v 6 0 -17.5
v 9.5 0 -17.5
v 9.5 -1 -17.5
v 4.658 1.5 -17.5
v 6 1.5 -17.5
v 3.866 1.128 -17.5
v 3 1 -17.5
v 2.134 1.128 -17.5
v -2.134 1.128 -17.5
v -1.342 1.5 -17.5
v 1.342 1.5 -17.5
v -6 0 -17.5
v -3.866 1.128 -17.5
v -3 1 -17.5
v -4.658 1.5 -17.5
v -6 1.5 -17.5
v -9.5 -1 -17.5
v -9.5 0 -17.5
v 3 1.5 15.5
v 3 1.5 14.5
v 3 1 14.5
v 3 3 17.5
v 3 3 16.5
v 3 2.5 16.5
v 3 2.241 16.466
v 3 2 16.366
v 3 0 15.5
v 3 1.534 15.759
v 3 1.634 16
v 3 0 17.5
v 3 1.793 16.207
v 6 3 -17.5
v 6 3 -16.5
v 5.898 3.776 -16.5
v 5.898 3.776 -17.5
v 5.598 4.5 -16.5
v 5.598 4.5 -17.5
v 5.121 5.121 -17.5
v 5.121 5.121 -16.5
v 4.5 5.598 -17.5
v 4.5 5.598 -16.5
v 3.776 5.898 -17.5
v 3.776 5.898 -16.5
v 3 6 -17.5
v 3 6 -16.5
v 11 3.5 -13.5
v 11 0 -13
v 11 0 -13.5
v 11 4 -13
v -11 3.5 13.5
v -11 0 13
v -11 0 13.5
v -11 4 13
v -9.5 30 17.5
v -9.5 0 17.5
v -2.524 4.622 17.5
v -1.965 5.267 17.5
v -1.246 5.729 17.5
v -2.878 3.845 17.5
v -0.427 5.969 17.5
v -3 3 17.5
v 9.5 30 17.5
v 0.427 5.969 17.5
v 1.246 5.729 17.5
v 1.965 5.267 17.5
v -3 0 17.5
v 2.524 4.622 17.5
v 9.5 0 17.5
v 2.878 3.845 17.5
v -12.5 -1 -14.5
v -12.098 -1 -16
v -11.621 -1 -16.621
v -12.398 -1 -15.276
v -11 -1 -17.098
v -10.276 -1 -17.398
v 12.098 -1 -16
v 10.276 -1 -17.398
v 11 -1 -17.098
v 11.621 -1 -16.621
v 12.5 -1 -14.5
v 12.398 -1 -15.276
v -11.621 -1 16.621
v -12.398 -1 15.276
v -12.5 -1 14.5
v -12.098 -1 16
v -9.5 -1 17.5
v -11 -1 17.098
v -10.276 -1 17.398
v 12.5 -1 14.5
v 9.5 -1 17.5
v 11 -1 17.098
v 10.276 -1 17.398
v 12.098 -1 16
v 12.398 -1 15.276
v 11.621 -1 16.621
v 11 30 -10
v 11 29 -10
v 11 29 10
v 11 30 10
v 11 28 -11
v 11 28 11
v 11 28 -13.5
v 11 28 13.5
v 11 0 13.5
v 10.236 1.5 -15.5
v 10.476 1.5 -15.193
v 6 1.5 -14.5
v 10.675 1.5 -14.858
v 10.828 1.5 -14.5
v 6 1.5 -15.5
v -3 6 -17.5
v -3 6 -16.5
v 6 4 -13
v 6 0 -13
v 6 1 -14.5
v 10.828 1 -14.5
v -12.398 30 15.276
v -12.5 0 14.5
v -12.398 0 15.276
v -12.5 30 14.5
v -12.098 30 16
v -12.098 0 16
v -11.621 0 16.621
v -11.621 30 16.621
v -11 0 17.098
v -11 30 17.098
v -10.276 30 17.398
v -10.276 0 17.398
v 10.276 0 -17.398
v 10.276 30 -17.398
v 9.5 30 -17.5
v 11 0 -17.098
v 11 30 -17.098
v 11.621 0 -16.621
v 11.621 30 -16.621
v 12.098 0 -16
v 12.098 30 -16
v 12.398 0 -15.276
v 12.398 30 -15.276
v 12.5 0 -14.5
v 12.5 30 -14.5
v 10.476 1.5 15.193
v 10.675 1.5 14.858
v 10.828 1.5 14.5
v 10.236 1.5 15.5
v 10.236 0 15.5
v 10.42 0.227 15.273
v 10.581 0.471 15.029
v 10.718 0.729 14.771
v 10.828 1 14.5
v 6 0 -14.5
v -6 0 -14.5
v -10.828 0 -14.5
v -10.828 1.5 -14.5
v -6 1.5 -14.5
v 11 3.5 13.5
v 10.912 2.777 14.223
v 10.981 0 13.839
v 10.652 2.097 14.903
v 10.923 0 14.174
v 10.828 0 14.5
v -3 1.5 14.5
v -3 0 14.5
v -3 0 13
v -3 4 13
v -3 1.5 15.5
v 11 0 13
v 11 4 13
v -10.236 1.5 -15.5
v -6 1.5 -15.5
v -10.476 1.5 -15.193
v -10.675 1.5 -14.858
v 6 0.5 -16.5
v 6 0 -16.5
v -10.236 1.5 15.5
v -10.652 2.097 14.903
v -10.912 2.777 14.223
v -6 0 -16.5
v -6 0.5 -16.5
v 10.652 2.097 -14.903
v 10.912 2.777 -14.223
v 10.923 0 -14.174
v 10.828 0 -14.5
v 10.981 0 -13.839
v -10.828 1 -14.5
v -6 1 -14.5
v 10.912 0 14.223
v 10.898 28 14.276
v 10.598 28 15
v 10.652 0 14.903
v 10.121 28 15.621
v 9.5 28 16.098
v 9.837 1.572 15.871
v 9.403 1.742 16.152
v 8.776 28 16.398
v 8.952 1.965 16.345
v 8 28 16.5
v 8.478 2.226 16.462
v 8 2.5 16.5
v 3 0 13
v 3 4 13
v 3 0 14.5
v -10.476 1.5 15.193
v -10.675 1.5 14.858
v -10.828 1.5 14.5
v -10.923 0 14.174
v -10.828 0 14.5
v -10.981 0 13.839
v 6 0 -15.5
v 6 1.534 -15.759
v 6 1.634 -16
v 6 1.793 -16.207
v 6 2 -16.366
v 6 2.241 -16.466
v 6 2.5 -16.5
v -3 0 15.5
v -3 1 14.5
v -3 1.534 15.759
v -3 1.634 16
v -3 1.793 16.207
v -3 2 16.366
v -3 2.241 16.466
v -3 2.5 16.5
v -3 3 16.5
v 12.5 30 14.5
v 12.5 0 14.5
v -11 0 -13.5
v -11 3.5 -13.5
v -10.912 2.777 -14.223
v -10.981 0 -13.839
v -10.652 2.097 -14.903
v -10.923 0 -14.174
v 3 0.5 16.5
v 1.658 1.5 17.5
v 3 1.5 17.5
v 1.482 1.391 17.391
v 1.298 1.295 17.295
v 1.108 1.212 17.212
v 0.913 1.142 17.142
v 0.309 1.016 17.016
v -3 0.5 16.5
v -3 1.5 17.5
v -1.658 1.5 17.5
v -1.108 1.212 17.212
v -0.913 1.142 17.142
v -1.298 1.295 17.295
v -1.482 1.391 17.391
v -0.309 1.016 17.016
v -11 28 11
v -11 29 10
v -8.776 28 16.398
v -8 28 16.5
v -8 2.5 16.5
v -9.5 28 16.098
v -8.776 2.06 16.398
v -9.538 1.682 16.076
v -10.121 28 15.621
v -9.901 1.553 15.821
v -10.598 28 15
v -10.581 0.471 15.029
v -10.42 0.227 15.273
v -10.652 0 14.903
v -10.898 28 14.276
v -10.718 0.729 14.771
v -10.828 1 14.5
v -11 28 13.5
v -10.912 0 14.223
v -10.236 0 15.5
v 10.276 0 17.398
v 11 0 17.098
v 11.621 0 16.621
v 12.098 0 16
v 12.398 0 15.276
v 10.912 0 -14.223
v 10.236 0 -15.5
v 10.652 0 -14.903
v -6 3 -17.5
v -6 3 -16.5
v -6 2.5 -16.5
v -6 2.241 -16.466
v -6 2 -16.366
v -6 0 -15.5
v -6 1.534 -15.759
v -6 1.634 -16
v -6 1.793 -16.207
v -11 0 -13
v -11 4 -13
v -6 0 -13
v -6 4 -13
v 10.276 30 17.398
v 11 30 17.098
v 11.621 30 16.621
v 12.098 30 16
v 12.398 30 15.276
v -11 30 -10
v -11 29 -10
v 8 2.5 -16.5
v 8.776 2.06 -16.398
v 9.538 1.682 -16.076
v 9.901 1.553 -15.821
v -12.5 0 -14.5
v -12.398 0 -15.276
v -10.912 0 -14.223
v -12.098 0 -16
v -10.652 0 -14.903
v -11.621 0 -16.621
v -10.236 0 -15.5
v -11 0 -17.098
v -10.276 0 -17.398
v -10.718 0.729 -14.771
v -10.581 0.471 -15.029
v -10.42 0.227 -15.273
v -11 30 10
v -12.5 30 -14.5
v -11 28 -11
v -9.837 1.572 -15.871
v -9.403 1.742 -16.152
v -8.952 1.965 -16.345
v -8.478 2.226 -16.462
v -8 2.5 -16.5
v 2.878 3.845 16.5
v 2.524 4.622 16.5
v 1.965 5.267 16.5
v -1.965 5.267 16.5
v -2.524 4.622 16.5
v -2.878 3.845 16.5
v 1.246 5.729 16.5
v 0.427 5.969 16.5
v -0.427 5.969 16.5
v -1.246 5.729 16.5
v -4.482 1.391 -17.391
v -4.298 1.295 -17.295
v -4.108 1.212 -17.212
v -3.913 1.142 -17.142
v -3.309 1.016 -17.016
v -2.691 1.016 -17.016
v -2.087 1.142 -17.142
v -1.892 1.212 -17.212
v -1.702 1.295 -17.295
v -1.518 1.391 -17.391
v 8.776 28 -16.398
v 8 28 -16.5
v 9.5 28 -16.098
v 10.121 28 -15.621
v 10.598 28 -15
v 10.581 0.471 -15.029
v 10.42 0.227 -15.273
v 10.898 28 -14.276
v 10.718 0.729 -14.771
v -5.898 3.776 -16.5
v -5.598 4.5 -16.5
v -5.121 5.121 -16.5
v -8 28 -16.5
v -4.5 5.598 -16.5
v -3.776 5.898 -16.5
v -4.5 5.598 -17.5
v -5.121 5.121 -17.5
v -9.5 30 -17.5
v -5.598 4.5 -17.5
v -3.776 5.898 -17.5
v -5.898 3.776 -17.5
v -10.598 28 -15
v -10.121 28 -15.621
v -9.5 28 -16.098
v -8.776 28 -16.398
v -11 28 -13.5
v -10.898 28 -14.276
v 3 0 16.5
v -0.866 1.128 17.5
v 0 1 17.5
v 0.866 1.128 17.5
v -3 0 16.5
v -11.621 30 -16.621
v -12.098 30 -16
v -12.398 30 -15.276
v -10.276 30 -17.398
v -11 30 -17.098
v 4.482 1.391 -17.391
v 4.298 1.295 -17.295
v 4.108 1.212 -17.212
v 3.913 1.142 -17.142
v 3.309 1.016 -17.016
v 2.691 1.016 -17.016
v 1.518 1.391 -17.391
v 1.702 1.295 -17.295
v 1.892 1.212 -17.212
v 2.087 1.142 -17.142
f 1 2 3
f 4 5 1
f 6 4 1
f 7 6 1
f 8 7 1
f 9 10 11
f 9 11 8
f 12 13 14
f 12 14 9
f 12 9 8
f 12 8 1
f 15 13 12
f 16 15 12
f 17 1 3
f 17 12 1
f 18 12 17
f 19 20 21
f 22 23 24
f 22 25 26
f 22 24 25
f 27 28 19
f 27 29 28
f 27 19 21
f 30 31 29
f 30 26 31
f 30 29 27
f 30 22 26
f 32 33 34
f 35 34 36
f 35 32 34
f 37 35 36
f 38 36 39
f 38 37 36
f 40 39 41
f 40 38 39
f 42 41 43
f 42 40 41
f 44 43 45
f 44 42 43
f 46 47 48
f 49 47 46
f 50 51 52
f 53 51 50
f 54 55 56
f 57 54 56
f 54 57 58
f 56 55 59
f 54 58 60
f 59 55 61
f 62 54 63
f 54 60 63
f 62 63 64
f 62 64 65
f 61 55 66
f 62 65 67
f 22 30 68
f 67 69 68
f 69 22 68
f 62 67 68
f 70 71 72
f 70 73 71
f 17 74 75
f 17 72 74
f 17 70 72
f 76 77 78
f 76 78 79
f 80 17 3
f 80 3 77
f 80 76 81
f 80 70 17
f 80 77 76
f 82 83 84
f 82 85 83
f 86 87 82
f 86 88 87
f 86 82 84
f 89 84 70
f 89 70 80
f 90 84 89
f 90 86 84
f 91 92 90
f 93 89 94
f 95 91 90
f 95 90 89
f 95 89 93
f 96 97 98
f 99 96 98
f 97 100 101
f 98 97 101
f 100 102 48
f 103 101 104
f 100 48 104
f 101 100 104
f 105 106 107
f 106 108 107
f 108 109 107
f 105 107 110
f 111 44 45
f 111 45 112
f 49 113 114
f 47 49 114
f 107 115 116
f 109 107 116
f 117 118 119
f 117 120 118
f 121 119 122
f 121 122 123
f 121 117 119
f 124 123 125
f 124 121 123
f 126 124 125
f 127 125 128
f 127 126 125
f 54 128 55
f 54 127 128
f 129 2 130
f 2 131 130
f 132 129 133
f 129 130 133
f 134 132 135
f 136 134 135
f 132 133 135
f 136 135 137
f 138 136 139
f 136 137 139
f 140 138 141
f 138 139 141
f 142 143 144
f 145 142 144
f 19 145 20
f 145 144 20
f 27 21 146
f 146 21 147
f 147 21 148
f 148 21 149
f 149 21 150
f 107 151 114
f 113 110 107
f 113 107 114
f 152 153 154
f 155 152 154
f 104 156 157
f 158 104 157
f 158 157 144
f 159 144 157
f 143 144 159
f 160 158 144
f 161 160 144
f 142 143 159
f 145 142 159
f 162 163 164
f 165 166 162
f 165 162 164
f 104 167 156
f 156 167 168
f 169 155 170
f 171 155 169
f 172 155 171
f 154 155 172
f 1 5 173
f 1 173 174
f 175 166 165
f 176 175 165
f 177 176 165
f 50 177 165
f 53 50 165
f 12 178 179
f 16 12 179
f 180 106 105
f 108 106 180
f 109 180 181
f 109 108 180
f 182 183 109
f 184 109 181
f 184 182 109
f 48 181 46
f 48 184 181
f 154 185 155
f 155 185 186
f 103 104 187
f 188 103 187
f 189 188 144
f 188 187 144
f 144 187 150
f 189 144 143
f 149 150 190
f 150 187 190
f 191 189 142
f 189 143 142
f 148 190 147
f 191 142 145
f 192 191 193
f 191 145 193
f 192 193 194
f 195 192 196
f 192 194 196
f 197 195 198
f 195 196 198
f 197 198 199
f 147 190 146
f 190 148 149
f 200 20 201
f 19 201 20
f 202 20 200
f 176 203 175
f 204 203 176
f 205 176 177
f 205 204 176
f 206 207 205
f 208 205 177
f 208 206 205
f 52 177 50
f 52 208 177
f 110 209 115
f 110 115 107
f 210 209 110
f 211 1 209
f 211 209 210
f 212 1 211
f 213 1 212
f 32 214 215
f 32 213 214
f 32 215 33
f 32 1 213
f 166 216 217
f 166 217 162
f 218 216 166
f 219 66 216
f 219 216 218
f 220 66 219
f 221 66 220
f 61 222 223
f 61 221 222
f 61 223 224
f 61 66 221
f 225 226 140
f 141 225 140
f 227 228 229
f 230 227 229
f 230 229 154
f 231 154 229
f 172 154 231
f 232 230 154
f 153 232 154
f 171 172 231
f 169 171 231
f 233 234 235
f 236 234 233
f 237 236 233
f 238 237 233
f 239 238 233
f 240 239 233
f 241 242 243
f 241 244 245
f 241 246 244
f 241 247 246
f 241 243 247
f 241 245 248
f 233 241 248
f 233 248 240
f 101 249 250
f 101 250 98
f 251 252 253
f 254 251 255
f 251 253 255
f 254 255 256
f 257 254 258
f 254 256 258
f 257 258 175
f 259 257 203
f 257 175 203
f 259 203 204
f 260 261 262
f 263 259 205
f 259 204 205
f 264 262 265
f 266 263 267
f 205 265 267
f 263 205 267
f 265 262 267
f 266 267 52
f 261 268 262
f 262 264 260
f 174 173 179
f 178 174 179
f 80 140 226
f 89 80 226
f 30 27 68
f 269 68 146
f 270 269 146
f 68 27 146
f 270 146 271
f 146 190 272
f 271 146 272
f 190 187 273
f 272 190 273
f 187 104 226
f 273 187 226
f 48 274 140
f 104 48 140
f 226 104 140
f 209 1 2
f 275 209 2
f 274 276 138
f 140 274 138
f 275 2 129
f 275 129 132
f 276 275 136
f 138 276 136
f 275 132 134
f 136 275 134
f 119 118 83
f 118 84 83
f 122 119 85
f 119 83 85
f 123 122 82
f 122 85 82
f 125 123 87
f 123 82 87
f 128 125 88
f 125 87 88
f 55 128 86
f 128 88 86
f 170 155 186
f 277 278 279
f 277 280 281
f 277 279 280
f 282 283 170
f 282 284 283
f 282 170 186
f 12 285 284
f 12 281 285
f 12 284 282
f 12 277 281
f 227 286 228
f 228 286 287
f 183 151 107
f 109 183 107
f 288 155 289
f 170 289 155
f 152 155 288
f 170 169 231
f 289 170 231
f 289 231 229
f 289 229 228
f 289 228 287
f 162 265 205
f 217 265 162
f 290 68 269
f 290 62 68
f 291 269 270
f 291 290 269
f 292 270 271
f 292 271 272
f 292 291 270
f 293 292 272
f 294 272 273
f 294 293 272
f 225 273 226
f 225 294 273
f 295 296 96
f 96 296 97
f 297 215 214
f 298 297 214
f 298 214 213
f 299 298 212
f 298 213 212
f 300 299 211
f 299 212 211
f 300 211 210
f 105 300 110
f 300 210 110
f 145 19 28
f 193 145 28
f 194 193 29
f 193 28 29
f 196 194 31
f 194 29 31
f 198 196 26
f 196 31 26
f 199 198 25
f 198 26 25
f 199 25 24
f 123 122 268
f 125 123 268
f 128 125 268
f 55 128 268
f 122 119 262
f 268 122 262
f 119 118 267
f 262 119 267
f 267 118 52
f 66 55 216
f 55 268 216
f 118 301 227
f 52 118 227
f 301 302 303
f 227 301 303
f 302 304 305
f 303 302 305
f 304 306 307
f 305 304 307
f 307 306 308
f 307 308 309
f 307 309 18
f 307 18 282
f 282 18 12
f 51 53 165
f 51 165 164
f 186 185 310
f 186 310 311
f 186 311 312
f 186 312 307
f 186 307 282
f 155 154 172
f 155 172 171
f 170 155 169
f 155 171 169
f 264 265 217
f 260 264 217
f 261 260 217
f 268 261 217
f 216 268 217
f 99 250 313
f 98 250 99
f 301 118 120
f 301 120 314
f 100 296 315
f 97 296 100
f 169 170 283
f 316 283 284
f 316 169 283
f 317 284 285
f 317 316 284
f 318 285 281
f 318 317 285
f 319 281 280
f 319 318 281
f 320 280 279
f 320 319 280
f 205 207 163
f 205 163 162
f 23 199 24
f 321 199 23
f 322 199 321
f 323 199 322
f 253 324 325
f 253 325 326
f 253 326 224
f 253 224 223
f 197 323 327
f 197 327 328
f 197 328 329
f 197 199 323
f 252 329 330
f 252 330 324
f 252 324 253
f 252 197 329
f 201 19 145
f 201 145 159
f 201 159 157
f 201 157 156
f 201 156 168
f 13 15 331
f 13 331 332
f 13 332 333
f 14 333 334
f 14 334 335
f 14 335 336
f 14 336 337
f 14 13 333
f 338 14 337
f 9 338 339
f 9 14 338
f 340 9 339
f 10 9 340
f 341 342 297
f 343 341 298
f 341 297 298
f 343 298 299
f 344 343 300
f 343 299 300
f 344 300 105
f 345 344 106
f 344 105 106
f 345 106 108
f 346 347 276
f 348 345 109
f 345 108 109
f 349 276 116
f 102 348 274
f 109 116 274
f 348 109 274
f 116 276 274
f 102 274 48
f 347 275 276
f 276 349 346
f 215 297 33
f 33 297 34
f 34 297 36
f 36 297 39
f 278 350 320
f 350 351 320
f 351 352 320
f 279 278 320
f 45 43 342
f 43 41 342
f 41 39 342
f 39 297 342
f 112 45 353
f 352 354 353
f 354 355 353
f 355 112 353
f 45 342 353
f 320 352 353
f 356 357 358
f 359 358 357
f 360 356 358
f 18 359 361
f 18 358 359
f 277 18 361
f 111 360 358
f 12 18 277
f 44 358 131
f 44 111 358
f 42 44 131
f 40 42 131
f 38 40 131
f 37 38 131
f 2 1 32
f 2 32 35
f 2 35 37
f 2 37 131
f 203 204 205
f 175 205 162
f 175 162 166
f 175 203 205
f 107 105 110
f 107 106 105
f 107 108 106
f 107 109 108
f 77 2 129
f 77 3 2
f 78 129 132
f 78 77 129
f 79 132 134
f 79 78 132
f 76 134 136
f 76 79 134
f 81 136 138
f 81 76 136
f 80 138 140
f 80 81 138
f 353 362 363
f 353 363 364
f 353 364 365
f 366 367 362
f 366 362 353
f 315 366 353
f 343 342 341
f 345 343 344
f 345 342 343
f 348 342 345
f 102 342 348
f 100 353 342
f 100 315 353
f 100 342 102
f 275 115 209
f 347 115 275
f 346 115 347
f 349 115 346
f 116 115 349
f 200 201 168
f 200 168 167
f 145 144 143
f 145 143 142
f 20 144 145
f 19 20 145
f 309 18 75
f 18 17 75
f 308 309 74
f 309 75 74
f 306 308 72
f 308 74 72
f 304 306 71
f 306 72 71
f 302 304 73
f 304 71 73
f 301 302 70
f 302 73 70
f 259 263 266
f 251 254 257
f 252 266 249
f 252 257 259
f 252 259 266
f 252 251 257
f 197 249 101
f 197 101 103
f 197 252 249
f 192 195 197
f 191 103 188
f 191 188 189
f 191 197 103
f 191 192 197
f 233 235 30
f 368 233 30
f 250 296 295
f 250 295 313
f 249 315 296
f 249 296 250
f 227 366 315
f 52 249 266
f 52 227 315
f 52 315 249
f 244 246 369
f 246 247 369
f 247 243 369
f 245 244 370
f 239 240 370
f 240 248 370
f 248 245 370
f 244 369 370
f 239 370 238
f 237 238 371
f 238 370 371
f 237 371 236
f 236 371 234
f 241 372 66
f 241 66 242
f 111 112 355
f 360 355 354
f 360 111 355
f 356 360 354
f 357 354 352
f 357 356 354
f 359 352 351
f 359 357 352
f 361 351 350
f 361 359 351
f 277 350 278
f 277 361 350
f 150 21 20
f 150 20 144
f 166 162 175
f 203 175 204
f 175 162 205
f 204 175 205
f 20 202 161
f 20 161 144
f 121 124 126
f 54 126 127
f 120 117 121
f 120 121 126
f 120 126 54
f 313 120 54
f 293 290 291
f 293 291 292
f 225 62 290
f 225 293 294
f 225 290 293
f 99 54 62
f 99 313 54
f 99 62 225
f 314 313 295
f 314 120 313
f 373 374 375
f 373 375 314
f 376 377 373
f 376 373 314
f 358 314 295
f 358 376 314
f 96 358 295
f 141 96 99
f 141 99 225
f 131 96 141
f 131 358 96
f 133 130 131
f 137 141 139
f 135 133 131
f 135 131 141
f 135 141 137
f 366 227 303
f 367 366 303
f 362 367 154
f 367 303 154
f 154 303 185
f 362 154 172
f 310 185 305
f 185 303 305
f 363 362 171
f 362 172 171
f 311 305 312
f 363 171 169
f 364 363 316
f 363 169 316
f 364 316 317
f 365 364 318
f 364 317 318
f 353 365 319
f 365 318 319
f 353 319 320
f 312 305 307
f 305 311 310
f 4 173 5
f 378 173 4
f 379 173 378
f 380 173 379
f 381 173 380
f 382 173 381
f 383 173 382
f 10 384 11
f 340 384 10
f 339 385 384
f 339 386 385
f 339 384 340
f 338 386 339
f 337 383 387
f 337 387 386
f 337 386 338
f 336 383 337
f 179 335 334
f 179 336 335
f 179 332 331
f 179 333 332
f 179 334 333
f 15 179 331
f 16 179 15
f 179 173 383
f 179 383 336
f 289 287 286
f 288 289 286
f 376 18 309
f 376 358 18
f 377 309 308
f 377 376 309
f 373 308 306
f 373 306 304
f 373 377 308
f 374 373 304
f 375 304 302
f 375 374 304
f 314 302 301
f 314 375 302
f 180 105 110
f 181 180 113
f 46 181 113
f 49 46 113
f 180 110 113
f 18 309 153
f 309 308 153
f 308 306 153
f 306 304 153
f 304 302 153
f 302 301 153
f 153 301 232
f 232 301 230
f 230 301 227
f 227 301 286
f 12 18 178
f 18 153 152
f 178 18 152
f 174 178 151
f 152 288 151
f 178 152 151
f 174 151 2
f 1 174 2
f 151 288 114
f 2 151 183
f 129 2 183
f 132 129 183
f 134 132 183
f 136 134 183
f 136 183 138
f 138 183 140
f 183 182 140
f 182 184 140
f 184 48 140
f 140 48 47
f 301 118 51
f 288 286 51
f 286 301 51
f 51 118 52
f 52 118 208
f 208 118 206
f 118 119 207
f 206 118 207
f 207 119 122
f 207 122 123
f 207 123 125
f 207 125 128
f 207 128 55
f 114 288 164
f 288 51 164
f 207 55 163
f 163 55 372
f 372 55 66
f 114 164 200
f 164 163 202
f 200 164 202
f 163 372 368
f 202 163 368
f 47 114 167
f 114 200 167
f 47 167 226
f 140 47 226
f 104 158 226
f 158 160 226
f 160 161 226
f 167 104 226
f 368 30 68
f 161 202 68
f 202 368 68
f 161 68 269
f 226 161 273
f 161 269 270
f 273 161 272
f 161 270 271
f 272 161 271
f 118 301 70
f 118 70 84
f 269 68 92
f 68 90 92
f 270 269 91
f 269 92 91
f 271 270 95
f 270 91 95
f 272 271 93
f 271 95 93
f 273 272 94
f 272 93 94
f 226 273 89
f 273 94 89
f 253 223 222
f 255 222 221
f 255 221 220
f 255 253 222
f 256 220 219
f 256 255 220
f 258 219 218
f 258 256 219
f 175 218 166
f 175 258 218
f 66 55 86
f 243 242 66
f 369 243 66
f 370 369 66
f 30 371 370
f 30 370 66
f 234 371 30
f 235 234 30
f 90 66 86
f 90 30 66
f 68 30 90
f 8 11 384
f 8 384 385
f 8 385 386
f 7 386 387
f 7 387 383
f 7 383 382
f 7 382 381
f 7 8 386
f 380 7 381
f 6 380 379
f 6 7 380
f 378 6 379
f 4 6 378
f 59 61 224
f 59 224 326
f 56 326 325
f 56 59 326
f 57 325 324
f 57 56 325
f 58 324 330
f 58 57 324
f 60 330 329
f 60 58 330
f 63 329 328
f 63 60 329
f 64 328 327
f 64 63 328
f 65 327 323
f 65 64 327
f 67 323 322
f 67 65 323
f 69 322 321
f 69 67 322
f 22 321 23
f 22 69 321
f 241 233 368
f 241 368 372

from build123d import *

# Parameters (mm, degrees)
SZKIC1_W                      = 25
SZKIC1_H                      = 35
SZKIC1_W_2                    = 22
SZKIC1_H_2                    = 20
DODANIE_WYCI_GNI_CIE1_DEPTH   = 30
SZKIC2_W                      = 22
SZKIC2_H                      = 4.5
WYTNIJ_WYCI_GNI_CIE1_DEPTH    = 28
SZKIC5_W                      = 22
SZKIC5_H                      = 26.5
WYTNIJ_WYCI_GNI_CIE2_DEPTH    = 2
DODANIE_WYCI_GNI_CIE2_DEPTH   = 22
DODANIE_WYCI_GNI_CIE2_2_DEPTH = 22
SZKIC7_W                      = 25
SZKIC7_H                      = 35
DODANIE_WYCI_GNI_CIE3_DEPTH   = 1
WYTNIJ_WYCI_GNI_CIE3_DEPTH    = 11
WYTNIJ_WYCI_GNI_CIE4_DEPTH    = 11
SZKIC10_W                     = 12
SZKIC10_H                     = 6.631969937
SZKIC10_W_2                   = 6
SZKIC10_H_2                   = 4.921641175
WYTNIJ_WYCI_GNI_CIE5_DEPTH    = 11
DODANIE_WYCI_GNI_CIE5_DEPTH   = 1
DODANIE_WYCI_GNI_CIE6_DEPTH   = 1
SFAZOWANIE1_SIZE              = 1
SFAZOWANIE2_SIZE              = 1
ZAOKR_GLENIE1_R               = 1
ZAOKR_GLENIE2_R               = 3
ZAOKR_GLENIE3_R               = 3
SFAZOWANIE3_SIZE              = 1
ZAOKR_GLENIE4_DEPTH           = 29
WYTNIJ_WYCI_GNI_CIE7_DEPTH    = 4


with BuildPart() as part:
    # Szkic1 → Dodanie-wyciągnięcie1 (new body)
    with BuildSketch(Plane(origin=(0, 0, 0), x_dir=(1, 0, 0), z_dir=(0, 1, 0))):
        Rectangle(SZKIC1_W, SZKIC1_H)
        Rectangle(SZKIC1_W_2, SZKIC1_H_2, mode=Mode.SUBTRACT)
    extrude(amount=DODANIE_WYCI_GNI_CIE1_DEPTH)

    # Szkic2 → Wytnij-wyciągnięcie1 (cut)
    with BuildSketch(Plane.XZ):
        with Locations((0, 12.25)):
            Rectangle(SZKIC2_W, SZKIC2_H)
        with Locations((0, -12.25)):
            Rectangle(SZKIC2_W, SZKIC2_H)
    extrude(amount=-WYTNIJ_WYCI_GNI_CIE1_DEPTH, mode=Mode.SUBTRACT)

    # Szkic5 → Wytnij-wyciągnięcie2 (cut)
    with BuildSketch(Plane(origin=(0, 0, 14.5), x_dir=(-1, 0, 0), z_dir=(0, 0, -1))):
        with Locations((0, 14.75)):
            Rectangle(SZKIC5_W, SZKIC5_H)
    wytnij_wyci_gni_cie2 = extrude(amount=-WYTNIJ_WYCI_GNI_CIE2_DEPTH, mode=Mode.SUBTRACT)

    # Lustro1: Wytnij-wyciągnięcie2 across plane
    add(wytnij_wyci_gni_cie2.mirror(Plane.XY), mode=Mode.SUBTRACT)


with BuildPart() as body_2:
    # Szkic6 → Dodanie-wyciągnięcie2 (new body)
    with BuildSketch(Plane(origin=(-11, 0, 0), x_dir=(0, 0, -1), z_dir=(1, 0, 0))):
        Polygon((-14.5, 1.5), (-15.5, 1.5), (-13, 4), (-13, 0), (-14.5, 0), align=None)
    extrude(amount=DODANIE_WYCI_GNI_CIE2_DEPTH)



with BuildPart() as body_3:
    # Szkic6 → Dodanie-wyci_gni_cie2 2 (new body)
    with BuildSketch(Plane(origin=(-11, 0, 0), x_dir=(0, 0, -1), z_dir=(1, 0, 0))):
        Polygon((14.5, 1.5), (15.5, 1.5), (13, 4), (13, 0), (14.5, 0), align=None)
    extrude(amount=DODANIE_WYCI_GNI_CIE2_2_DEPTH)


with BuildPart() as body_2_1:
    add(body_2.part)

    add(body_3.part)  # Dodanie-wyciągnięcie3 merges body 3
    # Szkic7 → Dodanie-wyciągnięcie3 (add)
    with BuildSketch(Plane.XZ):
        Rectangle(SZKIC7_W, SZKIC7_H)
    extrude(amount=DODANIE_WYCI_GNI_CIE3_DEPTH)


with BuildPart() as wytnij_wyci_gni_cie3_tool:
    # Szkic8 → Wytnij-wyciągnięcie3 (new body)
    with BuildSketch(Plane.XY.offset(17.5)):
        with BuildLine():
            Line((3, 3), (3, 0))
            Line((3, 0), (-3, 0))
            Line((-3, 0), (-3, 3))
            ThreePointArc((-3, 3), (0, 6), (3, 3))
        make_face()
    extrude(amount=-WYTNIJ_WYCI_GNI_CIE3_DEPTH)


with BuildPart() as part_1:
    add(part.part)

    # Wytnij-wyciągnięcie3: cut by wytnij_wyci_gni_cie3_tool
    add(wytnij_wyci_gni_cie3_tool.part, mode=Mode.SUBTRACT)


with BuildPart() as body_2_2:
    add(body_2_1.part)

    # Wytnij-wyciągnięcie3: cut by wytnij_wyci_gni_cie3_tool
    add(wytnij_wyci_gni_cie3_tool.part, mode=Mode.SUBTRACT)


with BuildPart() as wytnij_wyci_gni_cie4_tool:
    # Szkic9 → Wytnij-wyciągnięcie4 (new body)
    with BuildSketch(Plane(origin=(0, 0, -17.5), x_dir=(-1, 0, 0), z_dir=(0, 0, -1))):
        with BuildLine():
            Line((-6, 0), (-6, 3))
            ThreePointArc((-6, 3), (-5.121320344, 5.121320344), (-3, 6))
            Line((-3, 6), (3, 6))
            ThreePointArc((3, 6), (5.121320344, 5.121320344), (6, 3))
            Line((6, 3), (6, 0))
            Line((6, 0), (-6, 0))
        make_face()
    extrude(amount=-WYTNIJ_WYCI_GNI_CIE4_DEPTH)


with BuildPart() as part_2:
    add(part_1.part)

    # Wytnij-wyciągnięcie4: cut by wytnij_wyci_gni_cie4_tool
    add(wytnij_wyci_gni_cie4_tool.part, mode=Mode.SUBTRACT)

    # Sfazowanie2
    sfazowanie2_edges = [part_2.edges().sort_by_distance(p)[0] for p in [
        (8.5, 0, -14.5),
        (-7, 0, 14.5),
        (-8.5, 0, -14.5),
        (7, 0, 14.5),
    ]]
    chamfer(sfazowanie2_edges, length=SFAZOWANIE2_SIZE)

    # Zaokrąglenie1
    zaokr_glenie1_edges = [part_2.edges().sort_by_distance(p)[0] for p in [
        (-8.5, 1.5, -16.5),
        (7, 1.5, 16.5),
        (8.5, 1.5, -16.5),
        (-7, 1.5, 16.5),
    ]]
    fillet(zaokr_glenie1_edges, radius=ZAOKR_GLENIE1_R)

    # Zaokrąglenie2
    zaokr_glenie2_edges = [part_2.edges().sort_by_distance(p)[0] for p in [
        (12.5, 15, 17.5),
        (-12.5, 15, 17.5),
        (-12.5, 15, -17.5),
        (12.5, 15, -17.5),
    ]]
    fillet(zaokr_glenie2_edges, radius=ZAOKR_GLENIE2_R)

    # Sfazowanie3
    sfazowanie3_edges = [part_2.edges().sort_by_distance(p)[0] for p in [
        (0, 28, 10),
        (0, 28, -10),
    ]]
    chamfer(sfazowanie3_edges, length=SFAZOWANIE3_SIZE)

    # Zaokrąglenie4: read off the stored shape, not the designer's step
    # Zaokrąglenie4 outline → Zaokrąglenie4 (add)
    with BuildSketch(Plane(origin=(0, 0, 0), x_dir=(1, 0, 0), z_dir=(0, 1, 0))):
        with BuildLine():
            Line((11, 16.5), (8, 16.5))
            ThreePointArc((8, 16.5), (10.121320344, 15.621320344), (11, 13.5))
            Line((11, 13.5), (11, 16.5))
        make_face()
        with BuildLine():
            Line((-8, 16.5), (-11, 16.5))
            Line((-11, 16.5), (-11, 13.5))
            ThreePointArc((-11, 13.5), (-10.121320344, 15.621320344), (-8, 16.5))
        make_face()
        with BuildLine():
            ThreePointArc((11, -13.5), (10.121320344, -15.621320344), (8, -16.5))
            Line((8, -16.5), (11, -16.5))
            Line((11, -16.5), (11, -13.5))
        make_face()
        with BuildLine():
            Line((-11, -13.5), (-11, -16.5))
            Line((-11, -16.5), (-8, -16.5))
            ThreePointArc((-8, -16.5), (-10.121320344, -15.621320344), (-11, -13.5))
        make_face()
    extrude(amount=ZAOKR_GLENIE4_DEPTH)


with BuildPart() as body_2_3:
    add(body_2_2.part)

    # Wytnij-wyciągnięcie4: cut by wytnij_wyci_gni_cie4_tool
    add(wytnij_wyci_gni_cie4_tool.part, mode=Mode.SUBTRACT)

    # Szkic10 → Wytnij-wyciągnięcie5 (cut)
    with BuildSketch(Plane(origin=(0, 0, 0), x_dir=(1, 0, 0), z_dir=(0, 1, 0))):
        with Locations((0, 14.184015031)):
            Rectangle(SZKIC10_W, SZKIC10_H)
        with Locations((0, -14.039179413)):
            Rectangle(SZKIC10_W_2, SZKIC10_H_2)
    extrude(amount=WYTNIJ_WYCI_GNI_CIE5_DEPTH, mode=Mode.SUBTRACT)

    # Szkic12 → Dodanie-wyciągnięcie5 (add)
    with BuildSketch(Plane.XY.offset(17.5)):
        with BuildLine():
            Line((3, 0), (-3, 0))
            Line((-3, 0), (-3, 1.5))
            Line((-3, 1.5), (-1.658312395, 1.5))
            ThreePointArc((-1.658312395, 1.5), (0, 1), (1.658312395, 1.5))
            Line((1.658312395, 1.5), (3, 1.5))
            Line((3, 1.5), (3, 0))
        make_face()
    extrude(amount=-DODANIE_WYCI_GNI_CIE5_DEPTH)

    # Szkic13 → Dodanie-wyciągnięcie6 (add)
    with BuildSketch(Plane(origin=(0, 0, -17.5), x_dir=(-1, 0, 0), z_dir=(0, 0, -1))):
        with BuildLine():
            Line((-4.658312395, 1.5), (-6, 1.5))
            Line((-6, 1.5), (-6, 0))
            Line((-6, 0), (6, 0))
            Line((6, 0), (6, 1.5))
            Line((6, 1.5), (4.658312395, 1.5))
            ThreePointArc((4.658312395, 1.5), (3, 1), (1.341687605, 1.5))
            Line((1.341687605, 1.5), (-1.341687605, 1.5))
            ThreePointArc((-1.341687605, 1.5), (-3, 1), (-4.658312395, 1.5))
        make_face()
    extrude(amount=-DODANIE_WYCI_GNI_CIE6_DEPTH)

    # Sfazowanie1
    # the kernel refuses this chamfer: 1 mm, written as the material it takes off along each edge
    with BuildSketch(Plane(origin=(-5.571682988, 1.5, 16.5), x_dir=(0, 0, 1), z_dir=(1, 0, 0)), Plane(origin=(-0.913370593, 1.5, 16.5), x_dir=(0, 0, 1), z_dir=(1, 0, 0)), Plane(origin=(-8.571682988, 1.5, -16.5), x_dir=(0, -1, 0), z_dir=(1, 0, 0)), Plane(origin=(2.086629407, 1.5, -16.5), x_dir=(0, -1, 0), z_dir=(1, 0, 0))) as sfazowanie1_piece_1:
        Polygon((SFAZOWANIE1_SIZE, 0), (0, SFAZOWANIE1_SIZE), (0, 0), align=None)
    extrude(amount=6.485053581, mode=Mode.SUBTRACT)
    with BuildSketch(Plane(origin=(-3.913370593, 1.5, -16.5), x_dir=(0, -1, 0), z_dir=(1, 0, 0))) as sfazowanie1_piece_2:
        Polygon((SFAZOWANIE1_SIZE, 0), (0, SFAZOWANIE1_SIZE), (0, 0), align=None)
    extrude(amount=7.826741186, mode=Mode.SUBTRACT)

    # Zaokrąglenie3
    zaokr_glenie3_edges = [body_2_3.edges().sort_by_distance(p)[0] for p in [
        (-12.5, -0.5, 17.5),
        (-12.5, -0.5, -17.5),
        (12.5, -0.5, -17.5),
        (12.5, -0.5, 17.5),
    ]]
    fillet(zaokr_glenie3_edges, radius=ZAOKR_GLENIE3_R)

    # Wytnij-wyciągnięcie7: read off the stored shape, not the designer's step
    # Wytnij-wyciągnięcie7 outline → Wytnij-wyciągnięcie7 (cut)
    with BuildSketch(Plane(origin=(0, 0, 0), x_dir=(1, 0, 0), z_dir=(0, 1, 0))):
        with BuildLine():
            Line((8.894427189, 17), (10.236067977, 15.5))
            ThreePointArc((10.236067977, 15.5), (10.802517077, 14.570466269), (11, 13.5))
            Line((11, 13.5), (11, 15.5))
            Line((11, 15.5), (10.999999995, 17))
            Line((10.999999995, 17), (8.894427189, 17))
        make_face()
        with BuildLine():
            Line((-10.236067977, 15.5), (-8.894427189, 17))
            Line((-8.894427189, 17), (-10.999999998, 17))
            Line((-10.999999998, 17), (-10.999999995, 15.5))
            Line((-10.999999995, 15.5), (-11, 13.5))
            ThreePointArc((-11, 13.5), (-10.802517077, 14.570466269), (-10.236067977, 15.5))
        make_face()
        with BuildLine():
            Line((11, -15.5), (11, -13.5))
            ThreePointArc((11, -13.5), (10.802517077, -14.570466269), (10.236067977, -15.5))
            Line((10.236067977, -15.5), (8.894427189, -17))
            Line((8.894427189, -17), (10.999999998, -17))
            Line((10.999999998, -17), (11, -15.5))
        make_face()
        with BuildLine():
            Line((-10.999999995, -15.5), (-10.999999995, -17))
            Line((-10.999999995, -17), (-8.894427189, -17))
            Line((-8.894427189, -17), (-10.236067977, -15.5))
            ThreePointArc((-10.236067977, -15.5), (-10.802517077, -14.570466269), (-11, -13.5))
            Line((-11, -13.5), (-10.999999995, -15.5))
        make_face()
    extrude(amount=WYTNIJ_WYCI_GNI_CIE7_DEPTH, mode=Mode.SUBTRACT)


solid = Compound([part_2.part, body_2_3.part])
